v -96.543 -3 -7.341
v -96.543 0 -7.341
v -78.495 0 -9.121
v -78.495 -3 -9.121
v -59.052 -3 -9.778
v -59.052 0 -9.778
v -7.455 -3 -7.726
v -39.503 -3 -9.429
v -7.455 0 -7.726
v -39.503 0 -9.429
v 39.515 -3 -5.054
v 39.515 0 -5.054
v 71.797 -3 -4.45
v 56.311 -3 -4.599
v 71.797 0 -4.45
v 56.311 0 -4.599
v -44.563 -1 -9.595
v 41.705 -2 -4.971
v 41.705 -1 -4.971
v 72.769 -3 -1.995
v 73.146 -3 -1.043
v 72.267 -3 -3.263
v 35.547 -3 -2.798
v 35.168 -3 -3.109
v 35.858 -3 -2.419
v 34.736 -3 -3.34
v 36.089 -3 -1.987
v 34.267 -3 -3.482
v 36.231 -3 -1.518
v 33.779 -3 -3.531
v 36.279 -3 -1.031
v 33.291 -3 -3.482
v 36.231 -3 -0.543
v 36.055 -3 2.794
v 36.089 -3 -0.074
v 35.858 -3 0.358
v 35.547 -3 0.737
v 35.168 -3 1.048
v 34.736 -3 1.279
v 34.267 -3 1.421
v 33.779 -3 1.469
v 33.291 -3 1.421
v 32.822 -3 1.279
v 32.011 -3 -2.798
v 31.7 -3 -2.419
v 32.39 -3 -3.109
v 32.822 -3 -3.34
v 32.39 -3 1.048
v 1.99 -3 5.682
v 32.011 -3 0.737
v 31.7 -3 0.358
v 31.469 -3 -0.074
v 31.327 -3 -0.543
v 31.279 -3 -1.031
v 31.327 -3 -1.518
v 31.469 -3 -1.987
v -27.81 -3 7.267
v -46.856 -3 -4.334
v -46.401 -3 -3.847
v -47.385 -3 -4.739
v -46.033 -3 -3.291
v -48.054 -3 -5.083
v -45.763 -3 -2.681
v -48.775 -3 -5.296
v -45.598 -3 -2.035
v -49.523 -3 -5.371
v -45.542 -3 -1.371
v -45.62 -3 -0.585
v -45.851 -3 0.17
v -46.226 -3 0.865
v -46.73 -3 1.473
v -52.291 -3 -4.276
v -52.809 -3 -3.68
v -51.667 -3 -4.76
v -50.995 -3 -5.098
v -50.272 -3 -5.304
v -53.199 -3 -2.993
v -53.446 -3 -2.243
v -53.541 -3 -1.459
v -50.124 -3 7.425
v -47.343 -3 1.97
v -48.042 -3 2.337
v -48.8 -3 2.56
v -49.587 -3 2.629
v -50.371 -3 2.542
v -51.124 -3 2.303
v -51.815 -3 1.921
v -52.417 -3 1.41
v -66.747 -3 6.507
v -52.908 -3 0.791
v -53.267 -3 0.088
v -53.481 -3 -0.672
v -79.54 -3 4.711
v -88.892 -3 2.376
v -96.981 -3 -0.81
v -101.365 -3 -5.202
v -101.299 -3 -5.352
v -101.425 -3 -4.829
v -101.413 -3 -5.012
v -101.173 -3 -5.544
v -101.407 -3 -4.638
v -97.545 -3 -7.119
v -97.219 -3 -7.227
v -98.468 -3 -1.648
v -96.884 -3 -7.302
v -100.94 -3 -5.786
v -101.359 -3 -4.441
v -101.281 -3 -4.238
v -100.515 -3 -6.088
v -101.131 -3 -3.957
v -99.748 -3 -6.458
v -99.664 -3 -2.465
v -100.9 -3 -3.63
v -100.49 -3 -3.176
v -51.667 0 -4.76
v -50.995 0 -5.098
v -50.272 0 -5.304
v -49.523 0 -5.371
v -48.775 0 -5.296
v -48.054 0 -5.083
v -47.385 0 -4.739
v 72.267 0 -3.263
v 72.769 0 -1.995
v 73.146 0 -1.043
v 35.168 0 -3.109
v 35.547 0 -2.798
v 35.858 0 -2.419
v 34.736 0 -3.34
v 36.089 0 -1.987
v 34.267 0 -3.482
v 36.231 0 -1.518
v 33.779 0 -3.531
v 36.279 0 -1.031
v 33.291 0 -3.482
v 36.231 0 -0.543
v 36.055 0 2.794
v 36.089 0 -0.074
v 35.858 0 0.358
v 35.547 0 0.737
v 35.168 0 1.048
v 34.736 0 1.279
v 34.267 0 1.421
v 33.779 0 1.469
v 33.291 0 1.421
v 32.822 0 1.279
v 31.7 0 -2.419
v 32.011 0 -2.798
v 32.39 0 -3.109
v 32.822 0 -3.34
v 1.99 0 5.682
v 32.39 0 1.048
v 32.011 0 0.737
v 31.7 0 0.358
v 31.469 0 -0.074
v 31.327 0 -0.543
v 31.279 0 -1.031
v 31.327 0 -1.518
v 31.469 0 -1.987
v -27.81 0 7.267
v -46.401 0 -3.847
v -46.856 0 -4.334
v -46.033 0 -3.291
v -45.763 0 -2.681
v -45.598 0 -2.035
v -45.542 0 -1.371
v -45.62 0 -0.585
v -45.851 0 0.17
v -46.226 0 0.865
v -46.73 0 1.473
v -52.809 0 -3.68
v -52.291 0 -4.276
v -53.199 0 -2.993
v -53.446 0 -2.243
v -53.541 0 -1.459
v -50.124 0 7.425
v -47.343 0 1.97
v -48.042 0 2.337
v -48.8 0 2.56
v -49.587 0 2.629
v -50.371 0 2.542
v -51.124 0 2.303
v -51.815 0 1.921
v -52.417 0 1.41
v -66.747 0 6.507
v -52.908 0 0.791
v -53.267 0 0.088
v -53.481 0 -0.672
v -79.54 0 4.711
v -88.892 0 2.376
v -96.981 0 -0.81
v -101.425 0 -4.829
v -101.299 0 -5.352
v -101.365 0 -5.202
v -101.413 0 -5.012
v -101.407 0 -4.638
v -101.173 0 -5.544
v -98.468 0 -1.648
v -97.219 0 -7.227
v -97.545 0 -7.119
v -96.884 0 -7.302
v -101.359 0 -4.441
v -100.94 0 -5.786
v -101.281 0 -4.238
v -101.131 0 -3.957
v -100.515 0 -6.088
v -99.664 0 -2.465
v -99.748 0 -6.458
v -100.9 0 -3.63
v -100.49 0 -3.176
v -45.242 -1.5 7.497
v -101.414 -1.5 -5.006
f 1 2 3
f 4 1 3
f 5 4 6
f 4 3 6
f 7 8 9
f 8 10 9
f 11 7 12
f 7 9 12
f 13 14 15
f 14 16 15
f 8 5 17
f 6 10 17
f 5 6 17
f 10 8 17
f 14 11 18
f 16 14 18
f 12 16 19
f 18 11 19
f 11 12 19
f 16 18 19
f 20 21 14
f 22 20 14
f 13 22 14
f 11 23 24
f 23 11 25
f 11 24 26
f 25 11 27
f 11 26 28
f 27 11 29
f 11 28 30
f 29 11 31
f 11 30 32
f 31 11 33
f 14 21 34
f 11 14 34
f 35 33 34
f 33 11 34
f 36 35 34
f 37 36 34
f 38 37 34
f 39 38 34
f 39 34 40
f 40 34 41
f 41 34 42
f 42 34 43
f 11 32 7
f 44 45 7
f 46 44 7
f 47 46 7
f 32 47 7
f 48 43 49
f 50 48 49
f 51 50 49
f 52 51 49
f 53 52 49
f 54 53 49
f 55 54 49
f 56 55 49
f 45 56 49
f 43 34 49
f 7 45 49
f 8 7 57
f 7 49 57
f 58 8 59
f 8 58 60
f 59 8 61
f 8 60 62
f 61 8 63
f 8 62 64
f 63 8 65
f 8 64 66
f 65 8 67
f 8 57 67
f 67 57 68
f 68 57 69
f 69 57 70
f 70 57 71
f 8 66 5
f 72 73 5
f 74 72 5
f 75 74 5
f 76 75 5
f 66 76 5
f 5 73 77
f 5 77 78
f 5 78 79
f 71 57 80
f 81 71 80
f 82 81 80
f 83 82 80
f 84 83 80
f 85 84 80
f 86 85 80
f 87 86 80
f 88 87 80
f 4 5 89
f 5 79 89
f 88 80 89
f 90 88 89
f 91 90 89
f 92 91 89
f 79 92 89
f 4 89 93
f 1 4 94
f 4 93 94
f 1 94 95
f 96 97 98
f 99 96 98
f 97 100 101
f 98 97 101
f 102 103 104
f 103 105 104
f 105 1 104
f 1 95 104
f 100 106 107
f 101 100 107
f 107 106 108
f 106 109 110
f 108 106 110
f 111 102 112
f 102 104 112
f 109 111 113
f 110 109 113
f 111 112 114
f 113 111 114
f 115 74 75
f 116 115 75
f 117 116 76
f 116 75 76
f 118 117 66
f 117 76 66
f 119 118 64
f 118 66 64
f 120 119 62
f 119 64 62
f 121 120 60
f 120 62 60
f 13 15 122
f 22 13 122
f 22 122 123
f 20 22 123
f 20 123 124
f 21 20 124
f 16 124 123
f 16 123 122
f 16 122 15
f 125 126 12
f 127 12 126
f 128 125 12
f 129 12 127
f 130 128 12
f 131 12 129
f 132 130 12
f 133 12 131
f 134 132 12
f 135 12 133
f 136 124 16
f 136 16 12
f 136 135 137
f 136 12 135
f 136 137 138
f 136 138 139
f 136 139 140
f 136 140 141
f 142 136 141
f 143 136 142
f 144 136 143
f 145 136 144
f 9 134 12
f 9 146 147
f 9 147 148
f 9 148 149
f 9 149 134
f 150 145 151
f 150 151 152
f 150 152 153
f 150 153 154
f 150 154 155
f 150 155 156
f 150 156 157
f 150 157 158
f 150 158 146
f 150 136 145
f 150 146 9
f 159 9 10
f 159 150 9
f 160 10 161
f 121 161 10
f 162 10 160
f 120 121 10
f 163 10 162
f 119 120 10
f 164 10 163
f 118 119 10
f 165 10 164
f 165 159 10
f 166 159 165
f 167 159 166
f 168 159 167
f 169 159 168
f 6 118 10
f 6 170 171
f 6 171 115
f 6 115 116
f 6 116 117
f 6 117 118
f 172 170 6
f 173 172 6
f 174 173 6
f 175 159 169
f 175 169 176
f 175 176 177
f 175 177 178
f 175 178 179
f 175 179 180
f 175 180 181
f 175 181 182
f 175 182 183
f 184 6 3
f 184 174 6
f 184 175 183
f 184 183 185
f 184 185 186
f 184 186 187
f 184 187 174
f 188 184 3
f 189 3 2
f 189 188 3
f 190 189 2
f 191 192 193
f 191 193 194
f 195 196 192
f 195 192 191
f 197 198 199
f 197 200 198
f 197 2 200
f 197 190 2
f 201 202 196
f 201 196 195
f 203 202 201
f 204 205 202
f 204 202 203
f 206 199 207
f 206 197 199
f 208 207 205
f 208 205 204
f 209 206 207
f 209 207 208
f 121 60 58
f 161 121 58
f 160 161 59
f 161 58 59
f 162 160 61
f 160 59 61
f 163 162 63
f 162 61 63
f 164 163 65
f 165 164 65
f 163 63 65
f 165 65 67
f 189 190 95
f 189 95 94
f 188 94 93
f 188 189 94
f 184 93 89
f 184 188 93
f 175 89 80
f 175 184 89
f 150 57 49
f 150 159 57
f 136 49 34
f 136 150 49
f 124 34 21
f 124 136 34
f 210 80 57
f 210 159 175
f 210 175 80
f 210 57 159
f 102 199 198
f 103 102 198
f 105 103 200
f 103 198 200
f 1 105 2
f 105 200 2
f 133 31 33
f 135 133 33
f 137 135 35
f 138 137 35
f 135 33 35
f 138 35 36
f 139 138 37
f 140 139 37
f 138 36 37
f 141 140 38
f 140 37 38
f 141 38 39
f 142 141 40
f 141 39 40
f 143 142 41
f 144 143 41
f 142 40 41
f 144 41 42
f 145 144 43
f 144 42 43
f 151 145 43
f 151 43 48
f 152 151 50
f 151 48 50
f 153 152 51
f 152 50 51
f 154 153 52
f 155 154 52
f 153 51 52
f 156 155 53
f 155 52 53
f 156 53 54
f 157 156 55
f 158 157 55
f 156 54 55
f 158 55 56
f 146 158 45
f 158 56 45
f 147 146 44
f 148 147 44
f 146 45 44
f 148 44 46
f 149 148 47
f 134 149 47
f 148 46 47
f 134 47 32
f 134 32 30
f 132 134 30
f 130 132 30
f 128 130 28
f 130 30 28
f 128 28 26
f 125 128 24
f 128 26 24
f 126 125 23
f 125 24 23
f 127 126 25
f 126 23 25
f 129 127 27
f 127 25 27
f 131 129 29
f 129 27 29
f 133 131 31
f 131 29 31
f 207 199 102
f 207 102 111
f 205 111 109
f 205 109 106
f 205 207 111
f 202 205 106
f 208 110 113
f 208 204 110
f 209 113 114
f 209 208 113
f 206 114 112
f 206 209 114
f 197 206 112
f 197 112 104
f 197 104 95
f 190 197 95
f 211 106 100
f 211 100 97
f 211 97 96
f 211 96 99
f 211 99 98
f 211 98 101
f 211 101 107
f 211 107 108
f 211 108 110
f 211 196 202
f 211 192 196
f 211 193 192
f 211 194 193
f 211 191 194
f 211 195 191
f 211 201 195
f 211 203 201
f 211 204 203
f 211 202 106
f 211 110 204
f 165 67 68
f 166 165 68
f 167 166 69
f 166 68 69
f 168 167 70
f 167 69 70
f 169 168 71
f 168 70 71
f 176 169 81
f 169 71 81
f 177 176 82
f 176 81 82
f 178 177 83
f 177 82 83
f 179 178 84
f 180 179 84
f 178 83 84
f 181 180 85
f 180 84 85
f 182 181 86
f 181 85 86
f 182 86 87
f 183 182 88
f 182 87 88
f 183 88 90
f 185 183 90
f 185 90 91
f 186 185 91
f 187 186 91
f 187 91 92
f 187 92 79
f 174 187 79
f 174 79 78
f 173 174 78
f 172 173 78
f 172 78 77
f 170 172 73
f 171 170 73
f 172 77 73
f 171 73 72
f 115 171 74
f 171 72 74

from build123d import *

# Parameters (mm, degrees)
F2_DEPTH = 3
F1_R     = 2.5
F3_DEPTH = 3
F4_DEPTH = 3


with BuildPart() as f2:
    # F0 (on Front) → F2 (new body)
    with BuildSketch(Plane.XZ):
        with BuildLine():
            add(Edge.make_bspline(
                [(-96.9805282175, -0.8100506688), (-84.7869920978, 5.1468541776), (-43.2313518226, 10.3846705605), (26.8477938201, 4.0208678603), (73.1462007926, -1.0427900778)],
                knots=[0, 0, 0, 0, 0.374886421, 0.9004696716, 0.9004696716, 0.9004696716, 0.9004696716], degree=3))
            add(Edge.make_bspline(
                [(-97.5447368223, -7.1186651935), (-99.939251346, -6.5508492693), (-102.885147974, -5.168950634), (-100.0067471137, -2.3789404522), (-96.9805282175, -0.8100506688)],
                knots=[0.0564585679, 0.0564585679, 0.0564585679, 0.0564585679, 0.4847104148, 1, 1, 1, 1], degree=3))
            add(Edge.make_bspline(
                [(-96.5428845142, -7.3406707446), (-96.8949965543, -7.2673488468), (-97.22905608, -7.1935231869), (-97.5447368223, -7.1186651935)],
                knots=[0, 0, 0, 0, 0.0564585679, 0.0564585679, 0.0564585679, 0.0564585679], degree=3))
            add(Edge.make_bspline(
                [(-96.5428845142, -7.3406707446), (-80.7020161693, -9.4302402111), (-44.2471235075, -11.1181020976), (27.9226364637, -4.7767282079), (62.4434148738, -4.5021877215), (71.7967184236, -4.4503783305)],
                knots=[0, 0, 0, 0, 0.2987594418, 0.6837410955, 0.8381168975, 0.8381168975, 0.8381168975, 0.8381168975], degree=3))
            Line((71.7967184236, -4.4503783305), (72.2670713195, -3.2626866351))
            add(Edge.make_bspline(
                [(-97.3825784566, -6.0471531808), (-82.3468325761, -8.841713568), (-44.2551066449, -8.6286827794), (32.5707299039, -3.8332069517), (63.1103828262, -3.2710139005), (72.2670713195, -3.2626866351)],
                knots=[0, 0, 0, 0, 0.3131273629, 0.7122131732, 0.9019797674, 0.9019797674, 0.9019797674, 0.9019797674], degree=3))
            add(Edge.make_bspline(
                [(-97.3825784566, -6.0471531808), (-98.6588937786, -5.8946130057), (-100.1661659123, -5.1778479876), (-99.9138553768, -4.2244412327), (-99.8196757147, -4.047003109)],
                knots=[0, 0, 0, 0, 0.4440177242, 0.5425000514, 0.5425000514, 0.5425000514, 0.5425000514], degree=3))
            add(Edge.make_bspline(
                [(-99.8196757147, -4.047003109), (-99.3821638101, -3.2227137691), (-97.9006497107, -2.3042858417), (-96.3385477662, -1.6362179573)],
                knots=[0.5425000514, 0.5425000514, 0.5425000514, 0.5425000514, 1, 1, 1, 1], degree=3))
            add(Edge.make_bspline(
                [(-96.3385477662, -1.6362179573), (-85.7442874691, 3.2900694446), (-41.4192830911, 9.6956733525), (28.5693195485, 2.5855104747), (72.7689680214, -1.9953434339)],
                knots=[0, 0, 0, 0, 0.384923117, 0.9441251659, 0.9441251659, 0.9441251659, 0.9441251659], degree=3))
            Line((72.7689680214, -1.9953434339), (73.1462007926, -1.0427900778))
        make_face()
        with BuildLine():
            add(Edge.make_bspline(
                [(-96.5428845142, -7.3406707446), (-96.8949965543, -7.2673488468), (-97.22905608, -7.1935231869), (-97.5447368223, -7.1186651935)],
                knots=[0, 0, 0, 0, 0.0564585679, 0.0564585679, 0.0564585679, 0.0564585679], degree=3))
            ThreePointArc((-97.5447368223, -7.1186651935), (-97.052492706, -7.2688477084), (-96.5428845142, -7.3406707446))
        make_face()
        with BuildLine():
            Line((72.2670713195, -3.2626866351), (72.7689680214, -1.9953434339))
            add(Edge.make_bspline(
                [(-96.3385477662, -1.6362179573), (-85.7442874691, 3.2900694446), (-41.4192830911, 9.6956733525), (28.5693195485, 2.5855104747), (72.7689680214, -1.9953434339)],
                knots=[0, 0, 0, 0, 0.384923117, 0.9441251659, 0.9441251659, 0.9441251659, 0.9441251659], degree=3))
            add(Edge.make_bspline(
                [(-99.8196757147, -4.047003109), (-99.3821638101, -3.2227137691), (-97.9006497107, -2.3042858417), (-96.3385477662, -1.6362179573)],
                knots=[0.5425000514, 0.5425000514, 0.5425000514, 0.5425000514, 1, 1, 1, 1], degree=3))
            add(Edge.make_bspline(
                [(-97.3825784566, -6.0471531808), (-98.6588937786, -5.8946130057), (-100.1661659123, -5.1778479876), (-99.9138553768, -4.2244412327), (-99.8196757147, -4.047003109)],
                knots=[0, 0, 0, 0, 0.4440177242, 0.5425000514, 0.5425000514, 0.5425000514, 0.5425000514], degree=3))
            add(Edge.make_bspline(
                [(-97.3825784566, -6.0471531808), (-82.3468325761, -8.841713568), (-44.2551066449, -8.6286827794), (32.5707299039, -3.8332069517), (63.1103828262, -3.2710139005), (72.2670713195, -3.2626866351)],
                knots=[0, 0, 0, 0, 0.3131273629, 0.7122131732, 0.9019797674, 0.9019797674, 0.9019797674, 0.9019797674], degree=3))
        make_face()
    extrude(amount=F2_DEPTH)


with BuildPart() as f2b:
    # F1 (on Front) → F2, piece 2 (new body)
    with BuildSketch(Plane.XZ):
        with BuildLine():
            ThreePointArc((-45.542362095, -1.3708024857), (-51.4789804014, 2.1291274472), (-51.6671168627, -4.7598166753))
            Line((-51.6671168627, -4.7598166753), (-47.385046135, -4.7391830831))
            ThreePointArc((-47.385046135, -4.7391830831), (-46.0331411102, -3.2905337378), (-45.542362095, -1.3708024857))
        make_face()
        with BuildLine():
            Line((-47.385046135, -4.7391830831), (-51.6671168627, -4.7598166753))
            ThreePointArc((-51.6671168627, -4.7598166753), (-49.523087913, -5.3707560487), (-47.385046135, -4.7391830831))
        make_face()
    extrude(amount=F2_DEPTH)


with BuildPart() as f2c:
    # F1 (on Front) → F2, piece 3 (new body)
    with BuildSketch(Plane.XZ):
        with Locations((33.7789729238, -1.0305350879)):
            Circle(F1_R)
    extrude(amount=F2_DEPTH)


with BuildPart() as f3_tool:
    # F3 (cut): a face of the model
    f3_faces = [f2b.part.faces().sort_by_distance(p)[0] for p in [
        (-49.542362095, -3, -1.3708024857),
    ]]
    extrude(f3_faces, amount=-F3_DEPTH)


with BuildPart() as f2_1:
    add(f2.part)

    # F3: cut by f3_tool
    add(f3_tool.part, mode=Mode.SUBTRACT)


with BuildPart() as f2b_1:
    add(f2b.part)

    # F3: cut by f3_tool
    add(f3_tool.part, mode=Mode.SUBTRACT)


with BuildPart() as f4_tool:
    # F4 (cut): a face of the model
    f4_faces = [f2c.part.faces().sort_by_distance(p)[0] for p in [
        (33.7789729238, -3, -1.0305350879),
    ]]
    extrude(f4_faces, amount=-F4_DEPTH)


with BuildPart() as f2_2:
    add(f2_1.part)

    # F4: cut by f4_tool
    add(f4_tool.part, mode=Mode.SUBTRACT)


with BuildPart() as f2c_1:
    add(f2c.part)

    # F4: cut by f4_tool
    add(f4_tool.part, mode=Mode.SUBTRACT)


solid = f2_2.part
